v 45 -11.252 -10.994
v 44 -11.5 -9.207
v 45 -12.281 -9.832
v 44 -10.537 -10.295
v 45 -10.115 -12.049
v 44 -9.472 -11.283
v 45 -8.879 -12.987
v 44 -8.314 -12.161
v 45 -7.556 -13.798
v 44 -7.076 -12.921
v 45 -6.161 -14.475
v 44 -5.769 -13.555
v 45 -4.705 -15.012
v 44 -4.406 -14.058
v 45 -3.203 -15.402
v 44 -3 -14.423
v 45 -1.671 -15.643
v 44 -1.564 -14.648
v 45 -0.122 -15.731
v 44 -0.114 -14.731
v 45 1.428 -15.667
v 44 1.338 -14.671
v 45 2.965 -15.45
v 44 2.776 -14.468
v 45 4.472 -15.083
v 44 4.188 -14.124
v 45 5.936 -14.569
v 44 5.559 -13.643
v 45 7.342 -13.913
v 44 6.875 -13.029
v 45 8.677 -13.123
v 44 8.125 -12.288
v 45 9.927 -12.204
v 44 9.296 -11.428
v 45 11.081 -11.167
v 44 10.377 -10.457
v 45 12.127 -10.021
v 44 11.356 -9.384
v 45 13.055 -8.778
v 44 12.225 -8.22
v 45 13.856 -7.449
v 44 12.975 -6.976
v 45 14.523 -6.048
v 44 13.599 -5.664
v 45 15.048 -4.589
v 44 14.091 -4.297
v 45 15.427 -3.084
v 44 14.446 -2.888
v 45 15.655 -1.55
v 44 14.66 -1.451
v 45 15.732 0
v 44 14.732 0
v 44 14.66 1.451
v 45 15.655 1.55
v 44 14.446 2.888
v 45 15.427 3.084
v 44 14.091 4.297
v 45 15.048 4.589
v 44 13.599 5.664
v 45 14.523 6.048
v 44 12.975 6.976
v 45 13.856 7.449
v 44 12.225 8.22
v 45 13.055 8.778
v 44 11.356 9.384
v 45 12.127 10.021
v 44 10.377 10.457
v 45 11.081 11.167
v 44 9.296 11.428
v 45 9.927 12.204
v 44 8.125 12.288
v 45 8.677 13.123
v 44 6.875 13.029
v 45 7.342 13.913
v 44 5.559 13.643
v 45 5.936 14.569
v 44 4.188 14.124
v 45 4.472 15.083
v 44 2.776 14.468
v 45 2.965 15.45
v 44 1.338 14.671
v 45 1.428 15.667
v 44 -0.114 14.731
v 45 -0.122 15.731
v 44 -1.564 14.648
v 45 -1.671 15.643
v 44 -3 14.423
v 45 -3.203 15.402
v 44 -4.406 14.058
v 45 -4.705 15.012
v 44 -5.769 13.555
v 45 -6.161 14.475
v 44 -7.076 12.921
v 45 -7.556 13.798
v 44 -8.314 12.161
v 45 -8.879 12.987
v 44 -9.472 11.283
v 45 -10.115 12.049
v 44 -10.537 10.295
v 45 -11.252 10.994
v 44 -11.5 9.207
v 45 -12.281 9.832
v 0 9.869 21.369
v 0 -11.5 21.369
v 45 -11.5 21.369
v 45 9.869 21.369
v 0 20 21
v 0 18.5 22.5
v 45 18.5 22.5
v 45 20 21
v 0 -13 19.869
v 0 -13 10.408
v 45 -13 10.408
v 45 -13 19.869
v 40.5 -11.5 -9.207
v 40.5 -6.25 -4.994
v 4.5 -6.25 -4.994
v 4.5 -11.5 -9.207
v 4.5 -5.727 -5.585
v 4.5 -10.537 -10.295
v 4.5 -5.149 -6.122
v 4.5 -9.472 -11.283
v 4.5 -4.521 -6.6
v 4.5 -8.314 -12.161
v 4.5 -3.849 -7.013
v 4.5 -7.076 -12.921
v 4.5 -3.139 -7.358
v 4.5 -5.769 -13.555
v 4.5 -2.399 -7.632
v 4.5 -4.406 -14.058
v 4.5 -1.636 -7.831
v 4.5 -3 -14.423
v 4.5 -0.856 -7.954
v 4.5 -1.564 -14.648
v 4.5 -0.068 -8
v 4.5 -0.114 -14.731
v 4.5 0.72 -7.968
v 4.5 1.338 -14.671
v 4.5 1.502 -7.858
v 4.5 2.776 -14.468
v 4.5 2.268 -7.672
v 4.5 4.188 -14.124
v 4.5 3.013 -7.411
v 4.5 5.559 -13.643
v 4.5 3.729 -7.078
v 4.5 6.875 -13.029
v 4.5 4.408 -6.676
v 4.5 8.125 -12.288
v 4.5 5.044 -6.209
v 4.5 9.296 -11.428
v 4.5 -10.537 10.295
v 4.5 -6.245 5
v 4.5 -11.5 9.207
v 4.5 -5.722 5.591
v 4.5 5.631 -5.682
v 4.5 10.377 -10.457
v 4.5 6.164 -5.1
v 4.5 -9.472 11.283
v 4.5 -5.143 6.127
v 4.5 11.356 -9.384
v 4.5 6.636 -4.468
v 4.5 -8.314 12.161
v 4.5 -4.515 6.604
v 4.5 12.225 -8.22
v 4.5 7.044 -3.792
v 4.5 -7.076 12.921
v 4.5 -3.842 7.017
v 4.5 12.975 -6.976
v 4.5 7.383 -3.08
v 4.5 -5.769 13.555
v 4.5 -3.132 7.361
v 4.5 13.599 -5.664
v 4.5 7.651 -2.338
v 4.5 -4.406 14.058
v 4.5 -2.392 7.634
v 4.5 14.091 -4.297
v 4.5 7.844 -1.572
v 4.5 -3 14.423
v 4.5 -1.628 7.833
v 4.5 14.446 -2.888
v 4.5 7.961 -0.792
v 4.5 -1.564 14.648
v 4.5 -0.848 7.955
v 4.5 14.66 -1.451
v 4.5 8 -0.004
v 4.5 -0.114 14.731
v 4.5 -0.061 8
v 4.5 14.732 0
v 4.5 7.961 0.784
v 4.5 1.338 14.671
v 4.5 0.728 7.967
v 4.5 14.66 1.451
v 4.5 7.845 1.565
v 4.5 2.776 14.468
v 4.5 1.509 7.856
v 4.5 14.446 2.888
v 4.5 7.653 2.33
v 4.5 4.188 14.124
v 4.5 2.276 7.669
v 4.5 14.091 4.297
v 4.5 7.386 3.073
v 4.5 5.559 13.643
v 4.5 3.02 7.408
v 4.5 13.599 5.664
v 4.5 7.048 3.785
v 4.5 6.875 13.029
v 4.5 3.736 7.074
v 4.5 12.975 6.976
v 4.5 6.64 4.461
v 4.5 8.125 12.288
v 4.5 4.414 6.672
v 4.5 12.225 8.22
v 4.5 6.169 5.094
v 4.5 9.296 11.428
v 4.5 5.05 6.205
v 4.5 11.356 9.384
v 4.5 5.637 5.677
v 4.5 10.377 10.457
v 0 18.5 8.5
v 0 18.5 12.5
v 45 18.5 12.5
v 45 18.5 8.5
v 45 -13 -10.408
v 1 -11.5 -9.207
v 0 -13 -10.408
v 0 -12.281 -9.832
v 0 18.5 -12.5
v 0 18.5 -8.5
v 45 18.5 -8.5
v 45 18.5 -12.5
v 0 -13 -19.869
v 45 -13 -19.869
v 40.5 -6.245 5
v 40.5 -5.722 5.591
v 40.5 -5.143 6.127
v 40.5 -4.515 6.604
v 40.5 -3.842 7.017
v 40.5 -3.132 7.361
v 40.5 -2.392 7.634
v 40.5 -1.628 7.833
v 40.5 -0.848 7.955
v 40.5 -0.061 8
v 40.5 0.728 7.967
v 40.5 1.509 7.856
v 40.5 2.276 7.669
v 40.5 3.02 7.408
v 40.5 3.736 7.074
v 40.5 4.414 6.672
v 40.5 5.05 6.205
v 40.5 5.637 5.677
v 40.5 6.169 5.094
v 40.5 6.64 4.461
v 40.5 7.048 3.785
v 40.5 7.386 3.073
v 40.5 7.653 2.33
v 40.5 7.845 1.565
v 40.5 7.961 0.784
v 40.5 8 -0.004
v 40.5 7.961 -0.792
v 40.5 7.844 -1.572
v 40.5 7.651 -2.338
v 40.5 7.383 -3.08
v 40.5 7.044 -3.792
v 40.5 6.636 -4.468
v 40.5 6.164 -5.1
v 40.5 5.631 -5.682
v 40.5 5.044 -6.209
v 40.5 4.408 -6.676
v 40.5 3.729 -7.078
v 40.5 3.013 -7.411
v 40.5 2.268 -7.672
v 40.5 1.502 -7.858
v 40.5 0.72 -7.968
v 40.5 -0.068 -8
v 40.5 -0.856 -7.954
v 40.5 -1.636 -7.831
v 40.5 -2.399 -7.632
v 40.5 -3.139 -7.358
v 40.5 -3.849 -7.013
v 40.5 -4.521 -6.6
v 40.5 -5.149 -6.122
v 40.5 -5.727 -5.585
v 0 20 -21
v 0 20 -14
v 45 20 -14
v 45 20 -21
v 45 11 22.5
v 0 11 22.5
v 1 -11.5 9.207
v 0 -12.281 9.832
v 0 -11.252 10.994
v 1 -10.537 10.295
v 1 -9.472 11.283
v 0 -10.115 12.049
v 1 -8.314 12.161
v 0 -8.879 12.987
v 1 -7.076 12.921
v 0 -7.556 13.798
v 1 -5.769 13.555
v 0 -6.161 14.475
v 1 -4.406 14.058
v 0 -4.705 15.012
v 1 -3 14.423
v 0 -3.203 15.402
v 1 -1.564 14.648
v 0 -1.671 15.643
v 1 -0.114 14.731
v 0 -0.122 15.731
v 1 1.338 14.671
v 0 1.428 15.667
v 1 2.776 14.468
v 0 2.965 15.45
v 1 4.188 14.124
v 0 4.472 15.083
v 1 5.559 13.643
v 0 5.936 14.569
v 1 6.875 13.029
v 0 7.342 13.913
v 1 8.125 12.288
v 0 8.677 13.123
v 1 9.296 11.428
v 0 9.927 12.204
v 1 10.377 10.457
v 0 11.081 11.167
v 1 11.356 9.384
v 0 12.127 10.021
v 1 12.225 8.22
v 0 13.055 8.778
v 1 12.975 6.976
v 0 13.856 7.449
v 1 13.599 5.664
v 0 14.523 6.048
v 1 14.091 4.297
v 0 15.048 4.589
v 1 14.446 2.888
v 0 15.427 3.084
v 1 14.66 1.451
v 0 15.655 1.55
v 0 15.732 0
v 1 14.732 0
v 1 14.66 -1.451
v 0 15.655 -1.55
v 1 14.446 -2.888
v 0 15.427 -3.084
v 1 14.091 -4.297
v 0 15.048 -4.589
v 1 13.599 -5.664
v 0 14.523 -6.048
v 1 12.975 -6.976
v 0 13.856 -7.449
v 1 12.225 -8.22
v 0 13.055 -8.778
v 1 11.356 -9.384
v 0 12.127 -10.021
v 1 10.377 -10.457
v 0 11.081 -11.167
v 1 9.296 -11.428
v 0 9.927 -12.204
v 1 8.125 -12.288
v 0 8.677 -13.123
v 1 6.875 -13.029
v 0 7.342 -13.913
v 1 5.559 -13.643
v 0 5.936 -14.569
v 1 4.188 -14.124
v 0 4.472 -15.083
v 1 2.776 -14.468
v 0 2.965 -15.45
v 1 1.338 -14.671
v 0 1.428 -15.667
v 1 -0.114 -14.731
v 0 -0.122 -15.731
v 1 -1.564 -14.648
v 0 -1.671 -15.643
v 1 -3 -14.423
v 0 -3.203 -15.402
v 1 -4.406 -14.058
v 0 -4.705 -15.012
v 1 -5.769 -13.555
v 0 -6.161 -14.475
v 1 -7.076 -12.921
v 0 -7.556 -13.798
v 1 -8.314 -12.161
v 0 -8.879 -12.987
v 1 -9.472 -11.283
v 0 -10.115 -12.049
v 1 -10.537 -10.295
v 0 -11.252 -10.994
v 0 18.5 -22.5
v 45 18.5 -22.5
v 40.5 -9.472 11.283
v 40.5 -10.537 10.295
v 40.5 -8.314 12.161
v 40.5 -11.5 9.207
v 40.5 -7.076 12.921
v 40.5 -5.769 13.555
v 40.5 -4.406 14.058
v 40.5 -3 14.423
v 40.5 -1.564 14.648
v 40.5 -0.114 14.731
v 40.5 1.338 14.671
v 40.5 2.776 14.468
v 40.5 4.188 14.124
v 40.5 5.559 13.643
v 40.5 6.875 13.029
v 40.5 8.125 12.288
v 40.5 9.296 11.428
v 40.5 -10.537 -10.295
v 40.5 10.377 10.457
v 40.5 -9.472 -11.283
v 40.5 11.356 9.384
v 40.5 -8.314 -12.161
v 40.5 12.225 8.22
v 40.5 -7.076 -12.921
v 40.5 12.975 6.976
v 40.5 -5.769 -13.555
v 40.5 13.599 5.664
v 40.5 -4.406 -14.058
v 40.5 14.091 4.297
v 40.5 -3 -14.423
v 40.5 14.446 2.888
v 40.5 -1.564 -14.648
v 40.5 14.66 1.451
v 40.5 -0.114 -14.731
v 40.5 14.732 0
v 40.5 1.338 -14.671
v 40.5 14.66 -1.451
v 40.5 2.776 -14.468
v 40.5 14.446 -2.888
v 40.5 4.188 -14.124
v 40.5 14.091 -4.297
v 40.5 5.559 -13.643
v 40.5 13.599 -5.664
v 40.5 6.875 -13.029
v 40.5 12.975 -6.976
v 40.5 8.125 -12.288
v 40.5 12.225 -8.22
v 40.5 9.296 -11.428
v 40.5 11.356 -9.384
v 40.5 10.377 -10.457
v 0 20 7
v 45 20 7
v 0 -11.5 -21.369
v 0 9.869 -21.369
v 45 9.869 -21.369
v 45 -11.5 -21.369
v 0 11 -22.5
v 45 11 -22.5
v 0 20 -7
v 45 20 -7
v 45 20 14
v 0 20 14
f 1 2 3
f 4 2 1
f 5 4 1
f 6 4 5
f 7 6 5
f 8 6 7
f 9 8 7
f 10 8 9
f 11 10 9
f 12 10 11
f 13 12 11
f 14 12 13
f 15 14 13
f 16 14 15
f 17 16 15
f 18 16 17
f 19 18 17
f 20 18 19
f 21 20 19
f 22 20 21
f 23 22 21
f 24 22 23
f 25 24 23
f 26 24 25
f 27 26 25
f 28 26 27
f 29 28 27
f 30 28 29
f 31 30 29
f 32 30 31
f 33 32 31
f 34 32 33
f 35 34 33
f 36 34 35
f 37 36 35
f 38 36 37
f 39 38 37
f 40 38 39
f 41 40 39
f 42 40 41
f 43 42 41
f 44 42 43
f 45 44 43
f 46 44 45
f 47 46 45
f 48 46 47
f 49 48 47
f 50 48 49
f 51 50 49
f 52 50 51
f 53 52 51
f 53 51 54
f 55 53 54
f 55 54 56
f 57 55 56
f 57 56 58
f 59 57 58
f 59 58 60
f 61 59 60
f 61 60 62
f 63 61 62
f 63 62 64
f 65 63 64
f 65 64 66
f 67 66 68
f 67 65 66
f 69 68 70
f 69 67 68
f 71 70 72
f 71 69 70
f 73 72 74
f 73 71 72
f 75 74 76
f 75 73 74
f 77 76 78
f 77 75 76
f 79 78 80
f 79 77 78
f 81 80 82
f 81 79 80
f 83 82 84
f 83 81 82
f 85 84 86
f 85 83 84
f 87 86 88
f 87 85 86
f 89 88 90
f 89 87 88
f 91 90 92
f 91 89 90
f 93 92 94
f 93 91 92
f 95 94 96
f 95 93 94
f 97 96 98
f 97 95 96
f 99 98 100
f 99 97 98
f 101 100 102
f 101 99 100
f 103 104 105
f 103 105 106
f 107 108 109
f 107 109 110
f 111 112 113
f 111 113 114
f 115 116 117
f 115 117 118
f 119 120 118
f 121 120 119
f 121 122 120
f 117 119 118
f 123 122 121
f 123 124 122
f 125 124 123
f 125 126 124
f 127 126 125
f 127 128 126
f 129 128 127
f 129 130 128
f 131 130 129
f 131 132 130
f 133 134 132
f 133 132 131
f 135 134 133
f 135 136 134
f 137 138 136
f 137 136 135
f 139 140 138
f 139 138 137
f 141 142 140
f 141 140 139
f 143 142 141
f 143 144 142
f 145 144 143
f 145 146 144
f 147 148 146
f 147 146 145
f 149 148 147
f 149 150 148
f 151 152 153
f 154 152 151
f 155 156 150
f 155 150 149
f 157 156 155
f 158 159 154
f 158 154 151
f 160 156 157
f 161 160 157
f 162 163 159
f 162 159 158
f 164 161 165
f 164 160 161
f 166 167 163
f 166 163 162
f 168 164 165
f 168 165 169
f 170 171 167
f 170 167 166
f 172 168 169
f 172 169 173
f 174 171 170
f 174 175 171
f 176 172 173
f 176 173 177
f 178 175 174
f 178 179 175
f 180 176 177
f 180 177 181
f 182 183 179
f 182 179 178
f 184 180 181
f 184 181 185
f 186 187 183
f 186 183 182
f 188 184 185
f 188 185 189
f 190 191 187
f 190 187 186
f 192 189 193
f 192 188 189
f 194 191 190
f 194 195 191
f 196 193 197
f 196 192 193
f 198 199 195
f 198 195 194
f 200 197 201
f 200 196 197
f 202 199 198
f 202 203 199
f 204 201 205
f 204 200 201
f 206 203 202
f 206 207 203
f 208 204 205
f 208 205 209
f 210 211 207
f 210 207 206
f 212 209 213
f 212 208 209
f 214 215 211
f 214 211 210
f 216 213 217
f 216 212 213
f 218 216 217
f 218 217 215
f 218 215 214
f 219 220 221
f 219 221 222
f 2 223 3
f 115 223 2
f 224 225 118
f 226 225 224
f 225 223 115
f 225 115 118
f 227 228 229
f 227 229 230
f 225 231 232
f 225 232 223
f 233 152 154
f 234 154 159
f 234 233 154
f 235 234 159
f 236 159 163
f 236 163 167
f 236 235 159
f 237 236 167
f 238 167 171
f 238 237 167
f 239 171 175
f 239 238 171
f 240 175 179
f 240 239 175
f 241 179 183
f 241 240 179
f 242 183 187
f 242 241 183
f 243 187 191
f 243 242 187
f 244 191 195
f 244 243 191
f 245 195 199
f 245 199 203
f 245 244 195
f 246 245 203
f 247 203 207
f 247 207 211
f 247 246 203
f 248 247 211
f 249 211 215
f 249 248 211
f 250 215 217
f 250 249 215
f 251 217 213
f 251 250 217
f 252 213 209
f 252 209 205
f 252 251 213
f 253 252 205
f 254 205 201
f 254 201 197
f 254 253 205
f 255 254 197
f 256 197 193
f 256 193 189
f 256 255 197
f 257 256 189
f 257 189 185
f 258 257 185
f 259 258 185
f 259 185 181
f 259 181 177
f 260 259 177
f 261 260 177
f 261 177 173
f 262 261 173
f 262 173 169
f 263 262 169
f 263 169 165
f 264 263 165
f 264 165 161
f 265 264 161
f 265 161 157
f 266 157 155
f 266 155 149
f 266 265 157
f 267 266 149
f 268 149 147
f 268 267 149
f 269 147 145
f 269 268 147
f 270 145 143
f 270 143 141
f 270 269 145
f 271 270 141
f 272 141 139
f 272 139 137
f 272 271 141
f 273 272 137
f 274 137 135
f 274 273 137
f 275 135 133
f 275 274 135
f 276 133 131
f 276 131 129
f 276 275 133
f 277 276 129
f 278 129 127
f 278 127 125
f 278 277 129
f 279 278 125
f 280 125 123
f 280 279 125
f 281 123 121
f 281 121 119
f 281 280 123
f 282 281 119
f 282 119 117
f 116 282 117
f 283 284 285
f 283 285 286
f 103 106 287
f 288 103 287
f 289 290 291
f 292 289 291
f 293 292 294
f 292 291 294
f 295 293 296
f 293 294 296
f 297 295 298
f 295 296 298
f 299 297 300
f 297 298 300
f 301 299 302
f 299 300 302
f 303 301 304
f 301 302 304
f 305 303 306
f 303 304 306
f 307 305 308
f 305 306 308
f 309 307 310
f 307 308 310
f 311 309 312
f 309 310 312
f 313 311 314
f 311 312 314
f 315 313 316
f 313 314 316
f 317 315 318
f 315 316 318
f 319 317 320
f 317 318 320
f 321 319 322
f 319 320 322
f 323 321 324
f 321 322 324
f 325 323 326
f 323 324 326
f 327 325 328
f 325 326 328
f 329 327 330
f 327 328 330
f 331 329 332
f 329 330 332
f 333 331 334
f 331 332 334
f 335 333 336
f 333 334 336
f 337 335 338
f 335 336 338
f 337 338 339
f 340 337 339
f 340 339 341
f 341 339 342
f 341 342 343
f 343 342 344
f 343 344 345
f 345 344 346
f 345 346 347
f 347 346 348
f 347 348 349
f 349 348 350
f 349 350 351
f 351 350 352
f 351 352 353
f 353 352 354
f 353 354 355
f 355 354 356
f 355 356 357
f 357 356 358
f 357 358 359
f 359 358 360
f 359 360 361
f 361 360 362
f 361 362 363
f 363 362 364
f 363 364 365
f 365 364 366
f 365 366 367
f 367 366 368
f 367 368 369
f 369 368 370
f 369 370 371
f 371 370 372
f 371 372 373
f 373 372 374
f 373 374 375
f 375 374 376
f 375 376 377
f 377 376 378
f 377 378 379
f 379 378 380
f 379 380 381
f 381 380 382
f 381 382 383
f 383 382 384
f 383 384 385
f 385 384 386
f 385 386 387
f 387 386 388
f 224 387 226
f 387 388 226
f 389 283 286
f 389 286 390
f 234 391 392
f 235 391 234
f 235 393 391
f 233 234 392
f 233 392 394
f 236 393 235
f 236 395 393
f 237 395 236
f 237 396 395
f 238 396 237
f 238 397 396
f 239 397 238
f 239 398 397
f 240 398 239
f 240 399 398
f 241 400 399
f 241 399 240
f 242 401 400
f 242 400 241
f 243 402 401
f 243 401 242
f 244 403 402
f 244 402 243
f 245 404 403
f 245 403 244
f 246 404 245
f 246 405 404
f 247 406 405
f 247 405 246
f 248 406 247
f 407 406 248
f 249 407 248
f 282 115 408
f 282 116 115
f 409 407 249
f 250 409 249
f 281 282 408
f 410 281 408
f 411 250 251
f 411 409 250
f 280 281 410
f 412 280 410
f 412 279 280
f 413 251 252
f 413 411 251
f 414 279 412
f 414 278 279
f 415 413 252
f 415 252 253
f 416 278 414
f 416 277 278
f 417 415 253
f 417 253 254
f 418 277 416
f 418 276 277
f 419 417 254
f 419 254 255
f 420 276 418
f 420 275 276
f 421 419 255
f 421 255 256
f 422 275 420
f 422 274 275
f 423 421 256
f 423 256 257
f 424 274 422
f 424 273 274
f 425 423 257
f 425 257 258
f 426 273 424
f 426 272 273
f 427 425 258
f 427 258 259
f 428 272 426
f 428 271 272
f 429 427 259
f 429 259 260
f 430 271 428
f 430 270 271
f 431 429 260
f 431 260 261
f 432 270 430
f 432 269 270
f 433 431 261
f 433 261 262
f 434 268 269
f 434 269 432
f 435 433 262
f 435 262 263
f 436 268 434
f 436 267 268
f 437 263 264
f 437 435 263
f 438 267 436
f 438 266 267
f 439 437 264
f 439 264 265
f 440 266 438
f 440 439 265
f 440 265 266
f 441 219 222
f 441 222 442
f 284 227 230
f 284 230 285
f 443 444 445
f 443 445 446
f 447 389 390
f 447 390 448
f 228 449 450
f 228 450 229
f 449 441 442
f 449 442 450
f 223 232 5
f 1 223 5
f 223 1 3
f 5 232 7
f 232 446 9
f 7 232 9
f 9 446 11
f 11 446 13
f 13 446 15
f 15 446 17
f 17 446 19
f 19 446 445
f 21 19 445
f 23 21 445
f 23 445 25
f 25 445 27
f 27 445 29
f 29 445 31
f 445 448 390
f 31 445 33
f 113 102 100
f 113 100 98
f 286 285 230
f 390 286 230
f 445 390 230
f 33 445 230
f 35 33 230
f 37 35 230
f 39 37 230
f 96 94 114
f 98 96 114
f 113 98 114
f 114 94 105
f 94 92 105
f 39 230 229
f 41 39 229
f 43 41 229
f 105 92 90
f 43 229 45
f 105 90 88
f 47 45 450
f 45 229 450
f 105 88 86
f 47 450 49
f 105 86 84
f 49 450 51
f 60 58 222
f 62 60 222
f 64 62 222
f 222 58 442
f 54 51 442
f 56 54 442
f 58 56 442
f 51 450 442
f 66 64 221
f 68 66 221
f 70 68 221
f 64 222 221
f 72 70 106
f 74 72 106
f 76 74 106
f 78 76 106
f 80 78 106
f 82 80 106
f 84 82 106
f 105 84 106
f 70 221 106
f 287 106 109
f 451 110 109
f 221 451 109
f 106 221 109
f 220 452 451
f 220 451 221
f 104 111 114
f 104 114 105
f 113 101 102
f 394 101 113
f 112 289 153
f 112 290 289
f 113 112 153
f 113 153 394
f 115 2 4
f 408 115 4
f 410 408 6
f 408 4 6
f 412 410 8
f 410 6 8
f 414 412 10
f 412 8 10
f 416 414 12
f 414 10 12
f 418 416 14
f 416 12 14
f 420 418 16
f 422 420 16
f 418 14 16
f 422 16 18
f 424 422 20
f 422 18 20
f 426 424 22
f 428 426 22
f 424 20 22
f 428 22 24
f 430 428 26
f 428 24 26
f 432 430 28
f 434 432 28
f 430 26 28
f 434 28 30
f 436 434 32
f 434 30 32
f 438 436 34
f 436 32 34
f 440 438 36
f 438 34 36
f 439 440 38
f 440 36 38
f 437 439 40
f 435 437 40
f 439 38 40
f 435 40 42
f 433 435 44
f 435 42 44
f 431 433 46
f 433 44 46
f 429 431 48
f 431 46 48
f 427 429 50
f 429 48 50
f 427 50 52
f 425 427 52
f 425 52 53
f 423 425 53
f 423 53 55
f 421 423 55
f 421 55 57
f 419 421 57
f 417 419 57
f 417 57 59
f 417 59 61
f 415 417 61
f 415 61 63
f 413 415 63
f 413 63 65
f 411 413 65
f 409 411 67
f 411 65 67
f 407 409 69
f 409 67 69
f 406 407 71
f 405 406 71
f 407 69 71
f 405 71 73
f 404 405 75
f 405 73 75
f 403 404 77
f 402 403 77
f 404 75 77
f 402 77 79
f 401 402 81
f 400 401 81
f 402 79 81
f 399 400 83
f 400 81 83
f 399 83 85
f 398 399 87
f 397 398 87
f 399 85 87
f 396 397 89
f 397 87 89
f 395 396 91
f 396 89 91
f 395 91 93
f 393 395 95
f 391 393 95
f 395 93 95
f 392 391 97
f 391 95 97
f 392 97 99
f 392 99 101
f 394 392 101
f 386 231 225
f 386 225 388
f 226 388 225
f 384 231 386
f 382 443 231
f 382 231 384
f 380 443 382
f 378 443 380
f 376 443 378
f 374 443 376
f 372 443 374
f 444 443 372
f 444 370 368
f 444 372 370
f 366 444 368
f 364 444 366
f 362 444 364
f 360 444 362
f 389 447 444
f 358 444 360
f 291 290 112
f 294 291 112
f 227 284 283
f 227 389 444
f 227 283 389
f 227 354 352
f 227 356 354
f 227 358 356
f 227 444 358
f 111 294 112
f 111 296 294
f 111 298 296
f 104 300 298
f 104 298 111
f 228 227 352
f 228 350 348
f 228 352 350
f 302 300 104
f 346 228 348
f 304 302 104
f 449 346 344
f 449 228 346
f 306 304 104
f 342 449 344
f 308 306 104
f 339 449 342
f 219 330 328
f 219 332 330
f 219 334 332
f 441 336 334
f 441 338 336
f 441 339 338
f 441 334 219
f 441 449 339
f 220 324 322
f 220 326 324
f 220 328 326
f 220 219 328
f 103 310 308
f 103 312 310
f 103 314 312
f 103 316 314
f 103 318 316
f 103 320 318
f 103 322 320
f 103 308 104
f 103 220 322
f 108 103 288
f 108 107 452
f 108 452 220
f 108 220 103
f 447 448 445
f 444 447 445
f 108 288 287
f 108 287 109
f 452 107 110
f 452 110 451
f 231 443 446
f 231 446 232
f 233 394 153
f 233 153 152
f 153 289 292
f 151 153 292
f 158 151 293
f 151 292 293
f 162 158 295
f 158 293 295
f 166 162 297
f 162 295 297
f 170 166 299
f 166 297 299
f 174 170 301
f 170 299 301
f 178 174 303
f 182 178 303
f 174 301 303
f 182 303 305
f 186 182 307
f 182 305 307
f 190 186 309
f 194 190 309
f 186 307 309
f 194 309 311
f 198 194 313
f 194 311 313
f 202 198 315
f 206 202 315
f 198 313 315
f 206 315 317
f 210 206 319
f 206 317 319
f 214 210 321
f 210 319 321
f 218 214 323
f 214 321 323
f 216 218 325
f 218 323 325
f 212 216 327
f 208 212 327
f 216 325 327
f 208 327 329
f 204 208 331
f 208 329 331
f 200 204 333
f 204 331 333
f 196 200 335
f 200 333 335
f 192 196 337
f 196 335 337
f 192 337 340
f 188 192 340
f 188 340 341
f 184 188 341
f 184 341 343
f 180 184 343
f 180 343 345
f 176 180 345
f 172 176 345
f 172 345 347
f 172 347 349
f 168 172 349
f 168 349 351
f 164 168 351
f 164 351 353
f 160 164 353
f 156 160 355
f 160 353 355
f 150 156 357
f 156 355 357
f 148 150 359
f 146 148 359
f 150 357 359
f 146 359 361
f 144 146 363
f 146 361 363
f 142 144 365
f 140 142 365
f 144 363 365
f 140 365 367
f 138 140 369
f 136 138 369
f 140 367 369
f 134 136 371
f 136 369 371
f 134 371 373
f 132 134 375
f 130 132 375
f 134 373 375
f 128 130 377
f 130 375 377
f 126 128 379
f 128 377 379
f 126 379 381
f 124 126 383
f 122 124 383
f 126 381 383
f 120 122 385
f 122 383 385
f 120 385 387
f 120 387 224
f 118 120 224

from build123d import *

# Parameters (mm, degrees)
BOSS_EXTRUDE1_DEPTH = 45
CUT_EXTRUDE1_DEPTH  = 4.5
CUT_EXTRUDE2_DEPTH  = 4.5
CHAMFER3_SIZE       = 1
CHAMFER4_SIZE       = 1
CUT_EXTRUDE3_DEPTH  = 36


with BuildPart() as part:
    # Sketch1 → Boss-Extrude1 (new body)
    with BuildSketch(Plane(origin=(0, 0, 0), x_dir=(0, 0, -1), z_dir=(1, 0, 0))):
        Polygon((-22.5, 18.5), (-21, 20), (-14, 20), (-12.5, 18.5), (-8.5, 18.5), (-7, 20), (7, 20), (8.5, 18.5), (12.5, 18.5), (14, 20), (21, 20), (22.5, 18.5), (22.5, 11), (21.36862915, 9.86862915), (21.36862915, -11.5), (19.86862915, -13), (10.408329997, -13), (9.207368844, -11.5), (-9.207368844, -11.5), (-10.408329997, -13), (-19.86862915, -13), (-21.36862915, -11.5), (-21.36862915, 9.86862915), (-22.5, 11), align=None)
    extrude(amount=BOSS_EXTRUDE1_DEPTH)

    # Sketch8 → Cut-Extrude1 (cut)
    with BuildSketch(Plane.ZY):
        with BuildLine():
            Line((-9.207368844, -11.5), (9.207368844, -11.5))
            ThreePointArc((9.207368844, -11.5), (0, 14.73179015), (-9.207368844, -11.5))
        make_face()
    extrude(amount=-CUT_EXTRUDE1_DEPTH, mode=Mode.SUBTRACT)

    # Sketch9 → Cut-Extrude2 (cut)
    with BuildSketch(Plane(origin=(45, 0, 0), x_dir=(0, 0, -1), z_dir=(1, 0, 0))):
        with BuildLine():
            Line((-9.207368844, -11.5), (9.207368844, -11.5))
            ThreePointArc((9.207368844, -11.5), (0, 14.73179015), (-9.207368844, -11.5))
        make_face()
    extrude(amount=-CUT_EXTRUDE2_DEPTH, mode=Mode.SUBTRACT)

    # Chamfer3
    chamfer3_edges = [part.edges().sort_by_distance(p)[0] for p in [
        (45, 14.73179015, 0),
    ]]
    chamfer(chamfer3_edges, length=CHAMFER3_SIZE)

    # Chamfer4
    chamfer4_edges = [part.edges().sort_by_distance(p)[0] for p in [
        (0, 14.73179015, 0),
    ]]
    chamfer(chamfer4_edges, length=CHAMFER4_SIZE)

    # Sketch10 → Cut-Extrude3 (cut)
    with BuildSketch(Plane(origin=(40.5, 0, 0), x_dir=(0, 0, -1), z_dir=(1, 0, 0))):
        with BuildLine():
            ThreePointArc((-5, -6.244997998), (0.003880032, 7.999999059), (4.99393995, -6.2498451))
            Line((4.99393995, -6.2498451), (9.207368844, -11.5))
            Line((9.207368844, -11.5), (-9.207368844, -11.5))
            Line((-9.207368844, -11.5), (-5, -6.244997998))
        make_face()
    extrude(amount=-CUT_EXTRUDE3_DEPTH, mode=Mode.SUBTRACT)


solid = part.part
